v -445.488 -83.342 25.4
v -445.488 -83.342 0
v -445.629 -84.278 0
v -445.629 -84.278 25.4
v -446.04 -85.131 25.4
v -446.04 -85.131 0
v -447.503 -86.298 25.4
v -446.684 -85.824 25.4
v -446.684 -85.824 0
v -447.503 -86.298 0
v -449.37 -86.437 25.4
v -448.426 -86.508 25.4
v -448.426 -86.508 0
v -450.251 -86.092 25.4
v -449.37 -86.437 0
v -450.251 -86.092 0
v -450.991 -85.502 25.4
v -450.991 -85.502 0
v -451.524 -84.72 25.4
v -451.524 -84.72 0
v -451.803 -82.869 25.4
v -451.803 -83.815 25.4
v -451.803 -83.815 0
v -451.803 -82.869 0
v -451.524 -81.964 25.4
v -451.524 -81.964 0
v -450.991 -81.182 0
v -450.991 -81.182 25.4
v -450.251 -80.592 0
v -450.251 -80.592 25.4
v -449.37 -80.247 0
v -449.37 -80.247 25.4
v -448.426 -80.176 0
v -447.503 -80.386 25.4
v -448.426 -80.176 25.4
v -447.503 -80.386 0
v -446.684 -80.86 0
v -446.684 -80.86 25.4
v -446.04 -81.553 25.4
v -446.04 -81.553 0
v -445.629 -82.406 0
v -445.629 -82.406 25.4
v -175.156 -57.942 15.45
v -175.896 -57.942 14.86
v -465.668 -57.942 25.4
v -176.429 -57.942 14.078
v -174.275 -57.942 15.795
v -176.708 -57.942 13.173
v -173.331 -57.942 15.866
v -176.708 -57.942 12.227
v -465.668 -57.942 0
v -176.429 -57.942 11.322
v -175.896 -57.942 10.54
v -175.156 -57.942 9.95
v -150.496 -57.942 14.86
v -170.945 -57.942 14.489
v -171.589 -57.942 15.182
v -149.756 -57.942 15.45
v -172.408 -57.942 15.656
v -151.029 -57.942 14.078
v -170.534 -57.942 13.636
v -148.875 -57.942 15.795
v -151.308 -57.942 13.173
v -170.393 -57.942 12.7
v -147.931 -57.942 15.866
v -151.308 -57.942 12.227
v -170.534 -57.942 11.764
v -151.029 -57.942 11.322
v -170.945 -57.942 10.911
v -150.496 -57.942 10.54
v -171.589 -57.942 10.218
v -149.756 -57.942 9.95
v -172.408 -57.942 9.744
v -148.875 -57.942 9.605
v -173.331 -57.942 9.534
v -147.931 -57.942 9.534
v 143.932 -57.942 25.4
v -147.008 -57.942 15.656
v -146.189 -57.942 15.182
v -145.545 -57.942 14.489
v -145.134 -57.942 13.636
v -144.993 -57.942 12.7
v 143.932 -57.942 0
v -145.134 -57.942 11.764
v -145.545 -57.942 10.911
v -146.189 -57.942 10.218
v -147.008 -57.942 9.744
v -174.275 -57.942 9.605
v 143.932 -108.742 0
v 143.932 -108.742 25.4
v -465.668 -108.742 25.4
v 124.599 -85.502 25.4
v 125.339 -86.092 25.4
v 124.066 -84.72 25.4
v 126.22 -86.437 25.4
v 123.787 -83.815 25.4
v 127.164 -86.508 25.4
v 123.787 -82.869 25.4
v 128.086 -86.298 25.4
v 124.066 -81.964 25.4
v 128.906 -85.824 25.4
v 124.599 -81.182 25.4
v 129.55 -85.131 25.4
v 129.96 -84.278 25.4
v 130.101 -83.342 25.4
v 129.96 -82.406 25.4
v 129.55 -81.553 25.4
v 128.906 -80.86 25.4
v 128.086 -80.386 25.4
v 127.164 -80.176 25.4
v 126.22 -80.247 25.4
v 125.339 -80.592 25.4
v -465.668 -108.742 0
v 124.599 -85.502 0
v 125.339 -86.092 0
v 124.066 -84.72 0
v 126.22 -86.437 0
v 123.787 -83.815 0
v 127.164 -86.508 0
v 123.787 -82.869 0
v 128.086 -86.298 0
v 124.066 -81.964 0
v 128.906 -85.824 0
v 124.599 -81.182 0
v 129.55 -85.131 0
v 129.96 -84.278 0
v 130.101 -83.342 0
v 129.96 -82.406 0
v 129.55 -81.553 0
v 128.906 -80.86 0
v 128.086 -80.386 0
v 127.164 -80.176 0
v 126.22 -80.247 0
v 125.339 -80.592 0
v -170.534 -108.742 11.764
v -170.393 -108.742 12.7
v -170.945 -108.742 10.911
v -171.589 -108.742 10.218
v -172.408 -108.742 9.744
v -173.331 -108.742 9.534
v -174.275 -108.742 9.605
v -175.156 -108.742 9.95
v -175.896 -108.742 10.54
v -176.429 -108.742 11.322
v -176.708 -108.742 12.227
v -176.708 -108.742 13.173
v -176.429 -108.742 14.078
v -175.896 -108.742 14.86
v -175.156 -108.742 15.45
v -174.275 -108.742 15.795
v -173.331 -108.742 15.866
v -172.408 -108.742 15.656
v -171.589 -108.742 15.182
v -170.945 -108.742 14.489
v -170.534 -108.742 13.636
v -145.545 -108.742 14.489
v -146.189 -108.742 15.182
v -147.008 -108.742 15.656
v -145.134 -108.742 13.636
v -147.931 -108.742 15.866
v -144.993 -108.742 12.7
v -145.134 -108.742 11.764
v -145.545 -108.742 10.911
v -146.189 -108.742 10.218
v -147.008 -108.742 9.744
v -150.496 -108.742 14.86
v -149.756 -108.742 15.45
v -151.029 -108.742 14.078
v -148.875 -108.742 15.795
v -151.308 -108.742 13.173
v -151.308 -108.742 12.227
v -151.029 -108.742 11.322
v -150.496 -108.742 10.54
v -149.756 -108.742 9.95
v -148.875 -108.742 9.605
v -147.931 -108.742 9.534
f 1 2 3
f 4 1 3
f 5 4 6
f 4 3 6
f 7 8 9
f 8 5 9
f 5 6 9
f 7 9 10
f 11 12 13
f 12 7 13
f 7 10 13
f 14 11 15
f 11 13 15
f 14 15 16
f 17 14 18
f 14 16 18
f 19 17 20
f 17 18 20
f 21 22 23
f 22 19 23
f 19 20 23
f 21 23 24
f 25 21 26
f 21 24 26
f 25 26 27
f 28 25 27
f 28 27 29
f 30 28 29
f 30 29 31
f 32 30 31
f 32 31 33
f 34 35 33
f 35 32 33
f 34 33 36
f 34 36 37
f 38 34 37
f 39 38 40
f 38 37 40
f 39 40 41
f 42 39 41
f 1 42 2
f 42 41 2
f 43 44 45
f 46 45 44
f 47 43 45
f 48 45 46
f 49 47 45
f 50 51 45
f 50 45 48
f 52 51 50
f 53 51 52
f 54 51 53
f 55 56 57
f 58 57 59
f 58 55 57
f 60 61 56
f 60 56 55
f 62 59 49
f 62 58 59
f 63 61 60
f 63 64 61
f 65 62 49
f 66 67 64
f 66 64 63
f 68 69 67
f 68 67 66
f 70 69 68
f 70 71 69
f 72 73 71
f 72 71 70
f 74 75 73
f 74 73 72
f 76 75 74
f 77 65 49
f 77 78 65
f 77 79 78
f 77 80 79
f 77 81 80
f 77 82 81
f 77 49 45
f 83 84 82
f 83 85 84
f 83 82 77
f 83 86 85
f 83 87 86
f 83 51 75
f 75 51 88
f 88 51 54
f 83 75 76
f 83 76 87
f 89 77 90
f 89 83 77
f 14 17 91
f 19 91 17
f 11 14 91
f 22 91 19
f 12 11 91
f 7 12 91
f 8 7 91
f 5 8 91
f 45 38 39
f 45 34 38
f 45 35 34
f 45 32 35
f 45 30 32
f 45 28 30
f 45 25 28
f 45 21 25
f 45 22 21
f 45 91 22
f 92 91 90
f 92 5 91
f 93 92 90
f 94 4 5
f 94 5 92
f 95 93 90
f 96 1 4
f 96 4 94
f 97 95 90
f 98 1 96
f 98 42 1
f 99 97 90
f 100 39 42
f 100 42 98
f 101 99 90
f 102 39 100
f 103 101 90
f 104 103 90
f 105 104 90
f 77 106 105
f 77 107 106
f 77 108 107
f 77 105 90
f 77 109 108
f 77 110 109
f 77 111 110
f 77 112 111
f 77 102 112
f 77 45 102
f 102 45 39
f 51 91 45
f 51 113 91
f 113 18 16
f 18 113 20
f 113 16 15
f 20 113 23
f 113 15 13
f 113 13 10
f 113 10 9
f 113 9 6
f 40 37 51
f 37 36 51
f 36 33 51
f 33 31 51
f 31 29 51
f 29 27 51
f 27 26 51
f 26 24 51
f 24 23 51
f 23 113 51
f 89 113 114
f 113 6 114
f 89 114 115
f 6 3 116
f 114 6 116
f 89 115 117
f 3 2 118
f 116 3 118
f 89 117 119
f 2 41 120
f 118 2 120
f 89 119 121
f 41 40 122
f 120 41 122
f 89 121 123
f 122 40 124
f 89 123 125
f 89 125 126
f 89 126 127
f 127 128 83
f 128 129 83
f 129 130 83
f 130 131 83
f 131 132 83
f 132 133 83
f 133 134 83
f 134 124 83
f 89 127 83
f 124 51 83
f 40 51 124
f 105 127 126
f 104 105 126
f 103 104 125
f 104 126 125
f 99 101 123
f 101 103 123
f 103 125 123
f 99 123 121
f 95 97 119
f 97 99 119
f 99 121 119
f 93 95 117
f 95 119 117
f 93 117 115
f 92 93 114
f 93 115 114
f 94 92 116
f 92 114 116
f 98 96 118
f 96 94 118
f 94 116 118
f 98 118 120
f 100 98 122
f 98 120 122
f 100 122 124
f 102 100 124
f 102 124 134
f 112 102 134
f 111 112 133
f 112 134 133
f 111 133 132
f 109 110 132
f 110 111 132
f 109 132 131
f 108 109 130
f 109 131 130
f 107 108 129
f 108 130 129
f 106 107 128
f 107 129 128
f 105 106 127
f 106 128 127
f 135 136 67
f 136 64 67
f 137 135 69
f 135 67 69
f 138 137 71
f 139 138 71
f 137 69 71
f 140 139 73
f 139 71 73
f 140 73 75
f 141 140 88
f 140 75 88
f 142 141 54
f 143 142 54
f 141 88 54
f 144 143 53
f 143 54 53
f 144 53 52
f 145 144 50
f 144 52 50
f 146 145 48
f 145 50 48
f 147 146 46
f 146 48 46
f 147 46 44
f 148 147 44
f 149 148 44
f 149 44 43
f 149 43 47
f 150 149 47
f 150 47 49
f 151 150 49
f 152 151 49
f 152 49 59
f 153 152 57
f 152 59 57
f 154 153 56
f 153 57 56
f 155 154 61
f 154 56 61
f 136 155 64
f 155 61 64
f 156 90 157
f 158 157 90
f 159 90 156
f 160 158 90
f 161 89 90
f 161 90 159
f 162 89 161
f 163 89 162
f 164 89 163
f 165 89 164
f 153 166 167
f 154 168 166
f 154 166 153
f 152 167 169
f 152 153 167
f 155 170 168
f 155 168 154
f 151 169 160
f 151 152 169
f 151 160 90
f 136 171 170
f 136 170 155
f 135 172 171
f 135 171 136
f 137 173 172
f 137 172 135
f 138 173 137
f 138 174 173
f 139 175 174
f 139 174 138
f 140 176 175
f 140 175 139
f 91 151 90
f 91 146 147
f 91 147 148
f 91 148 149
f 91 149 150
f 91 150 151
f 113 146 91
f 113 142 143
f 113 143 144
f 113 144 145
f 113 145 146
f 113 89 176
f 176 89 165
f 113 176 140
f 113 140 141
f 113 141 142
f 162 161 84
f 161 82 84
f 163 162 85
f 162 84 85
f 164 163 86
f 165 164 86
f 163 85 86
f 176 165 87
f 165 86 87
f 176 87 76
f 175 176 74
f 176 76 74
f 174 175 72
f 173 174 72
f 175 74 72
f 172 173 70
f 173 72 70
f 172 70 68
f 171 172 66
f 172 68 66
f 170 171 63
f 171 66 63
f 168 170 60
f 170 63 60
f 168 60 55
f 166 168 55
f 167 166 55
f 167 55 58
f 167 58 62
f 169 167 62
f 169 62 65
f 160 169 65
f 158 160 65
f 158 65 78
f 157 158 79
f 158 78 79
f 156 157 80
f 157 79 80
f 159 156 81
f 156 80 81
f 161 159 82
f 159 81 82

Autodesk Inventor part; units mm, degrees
ref_plane "YZ Plane" through (0, 0, 0) normal (1, 0, 0) x (0, 1, 0)
ref_plane "XZ Plane" through (0, 0, 0) normal (0, 1, 0) x (-1, 0, 0)
ref_plane "XY Plane" through (0, 0, 0) normal (0, 0, 1) x (1, 0, 0)
sketch "Sketch1" plane through (0, 0, 0) normal (0, 0, 1) x (1, 0, 0)
  line L0 (-465.6684, -57.942) -> (143.9316, -57.942)
  line L1 (143.9316, -57.942) -> (143.9316, -108.742)
  line L2 (143.9316, -108.742) -> (-465.6684, -108.742)
  line L3 (-465.6684, -108.742) -> (-465.6684, -57.942)
  line L4 (-465.6684, -83.342) -> (143.9316, -83.342) construction
  circle A0 centre (-448.6631, -83.342) radius 3.175
  circle A1 centre (126.9263, -83.342) radius 3.175
  line L5 (-160.8684, -57.942) -> (-160.8684, -108.742) construction
  point P0 (0, 0)
  dimension "d0" = 575.5894
  dimension "d1" = 287.7947
  dimension "d2" = 609.6
  dimension "d3" = 6.35
  dimension "d4" = 50.8
extrude "Extrusion1" add sketch "Sketch1" along normal blind 25.4
sketch "Sketch2" plane through (-465.6684, -57.942, 0) normal (0, 1, 0) x (1, 0, 0)
  line L0 (0, 0) -> (0, -25.4) construction
  line L1 (0, -12.7) -> (609.6, -12.7) construction
  line L2 (609.6, 0) -> (609.6, -25.4) construction
  line L3 (0, -25.4) -> (609.6, -25.4) construction
  line L4 (304.8, -25.4) -> (304.8, 0) construction
  line L5 (0, 0) -> (609.6, 0) construction
  circle A0 centre (292.1, -12.7) radius 3.175
  circle A1 centre (317.5, -12.7) radius 3.175
  point P0 (465.6684, 0)
  dimension "d7" = 6.35
  dimension "d8" = 12.7
  dimension "d9" = 12.7
extrude "Extrusion2" cut sketch "Sketch2" against normal through all
equation "\"d1\" = 0.5 * d0"
equation "\"d9\" = d8"
properties part number "chair-beam"
